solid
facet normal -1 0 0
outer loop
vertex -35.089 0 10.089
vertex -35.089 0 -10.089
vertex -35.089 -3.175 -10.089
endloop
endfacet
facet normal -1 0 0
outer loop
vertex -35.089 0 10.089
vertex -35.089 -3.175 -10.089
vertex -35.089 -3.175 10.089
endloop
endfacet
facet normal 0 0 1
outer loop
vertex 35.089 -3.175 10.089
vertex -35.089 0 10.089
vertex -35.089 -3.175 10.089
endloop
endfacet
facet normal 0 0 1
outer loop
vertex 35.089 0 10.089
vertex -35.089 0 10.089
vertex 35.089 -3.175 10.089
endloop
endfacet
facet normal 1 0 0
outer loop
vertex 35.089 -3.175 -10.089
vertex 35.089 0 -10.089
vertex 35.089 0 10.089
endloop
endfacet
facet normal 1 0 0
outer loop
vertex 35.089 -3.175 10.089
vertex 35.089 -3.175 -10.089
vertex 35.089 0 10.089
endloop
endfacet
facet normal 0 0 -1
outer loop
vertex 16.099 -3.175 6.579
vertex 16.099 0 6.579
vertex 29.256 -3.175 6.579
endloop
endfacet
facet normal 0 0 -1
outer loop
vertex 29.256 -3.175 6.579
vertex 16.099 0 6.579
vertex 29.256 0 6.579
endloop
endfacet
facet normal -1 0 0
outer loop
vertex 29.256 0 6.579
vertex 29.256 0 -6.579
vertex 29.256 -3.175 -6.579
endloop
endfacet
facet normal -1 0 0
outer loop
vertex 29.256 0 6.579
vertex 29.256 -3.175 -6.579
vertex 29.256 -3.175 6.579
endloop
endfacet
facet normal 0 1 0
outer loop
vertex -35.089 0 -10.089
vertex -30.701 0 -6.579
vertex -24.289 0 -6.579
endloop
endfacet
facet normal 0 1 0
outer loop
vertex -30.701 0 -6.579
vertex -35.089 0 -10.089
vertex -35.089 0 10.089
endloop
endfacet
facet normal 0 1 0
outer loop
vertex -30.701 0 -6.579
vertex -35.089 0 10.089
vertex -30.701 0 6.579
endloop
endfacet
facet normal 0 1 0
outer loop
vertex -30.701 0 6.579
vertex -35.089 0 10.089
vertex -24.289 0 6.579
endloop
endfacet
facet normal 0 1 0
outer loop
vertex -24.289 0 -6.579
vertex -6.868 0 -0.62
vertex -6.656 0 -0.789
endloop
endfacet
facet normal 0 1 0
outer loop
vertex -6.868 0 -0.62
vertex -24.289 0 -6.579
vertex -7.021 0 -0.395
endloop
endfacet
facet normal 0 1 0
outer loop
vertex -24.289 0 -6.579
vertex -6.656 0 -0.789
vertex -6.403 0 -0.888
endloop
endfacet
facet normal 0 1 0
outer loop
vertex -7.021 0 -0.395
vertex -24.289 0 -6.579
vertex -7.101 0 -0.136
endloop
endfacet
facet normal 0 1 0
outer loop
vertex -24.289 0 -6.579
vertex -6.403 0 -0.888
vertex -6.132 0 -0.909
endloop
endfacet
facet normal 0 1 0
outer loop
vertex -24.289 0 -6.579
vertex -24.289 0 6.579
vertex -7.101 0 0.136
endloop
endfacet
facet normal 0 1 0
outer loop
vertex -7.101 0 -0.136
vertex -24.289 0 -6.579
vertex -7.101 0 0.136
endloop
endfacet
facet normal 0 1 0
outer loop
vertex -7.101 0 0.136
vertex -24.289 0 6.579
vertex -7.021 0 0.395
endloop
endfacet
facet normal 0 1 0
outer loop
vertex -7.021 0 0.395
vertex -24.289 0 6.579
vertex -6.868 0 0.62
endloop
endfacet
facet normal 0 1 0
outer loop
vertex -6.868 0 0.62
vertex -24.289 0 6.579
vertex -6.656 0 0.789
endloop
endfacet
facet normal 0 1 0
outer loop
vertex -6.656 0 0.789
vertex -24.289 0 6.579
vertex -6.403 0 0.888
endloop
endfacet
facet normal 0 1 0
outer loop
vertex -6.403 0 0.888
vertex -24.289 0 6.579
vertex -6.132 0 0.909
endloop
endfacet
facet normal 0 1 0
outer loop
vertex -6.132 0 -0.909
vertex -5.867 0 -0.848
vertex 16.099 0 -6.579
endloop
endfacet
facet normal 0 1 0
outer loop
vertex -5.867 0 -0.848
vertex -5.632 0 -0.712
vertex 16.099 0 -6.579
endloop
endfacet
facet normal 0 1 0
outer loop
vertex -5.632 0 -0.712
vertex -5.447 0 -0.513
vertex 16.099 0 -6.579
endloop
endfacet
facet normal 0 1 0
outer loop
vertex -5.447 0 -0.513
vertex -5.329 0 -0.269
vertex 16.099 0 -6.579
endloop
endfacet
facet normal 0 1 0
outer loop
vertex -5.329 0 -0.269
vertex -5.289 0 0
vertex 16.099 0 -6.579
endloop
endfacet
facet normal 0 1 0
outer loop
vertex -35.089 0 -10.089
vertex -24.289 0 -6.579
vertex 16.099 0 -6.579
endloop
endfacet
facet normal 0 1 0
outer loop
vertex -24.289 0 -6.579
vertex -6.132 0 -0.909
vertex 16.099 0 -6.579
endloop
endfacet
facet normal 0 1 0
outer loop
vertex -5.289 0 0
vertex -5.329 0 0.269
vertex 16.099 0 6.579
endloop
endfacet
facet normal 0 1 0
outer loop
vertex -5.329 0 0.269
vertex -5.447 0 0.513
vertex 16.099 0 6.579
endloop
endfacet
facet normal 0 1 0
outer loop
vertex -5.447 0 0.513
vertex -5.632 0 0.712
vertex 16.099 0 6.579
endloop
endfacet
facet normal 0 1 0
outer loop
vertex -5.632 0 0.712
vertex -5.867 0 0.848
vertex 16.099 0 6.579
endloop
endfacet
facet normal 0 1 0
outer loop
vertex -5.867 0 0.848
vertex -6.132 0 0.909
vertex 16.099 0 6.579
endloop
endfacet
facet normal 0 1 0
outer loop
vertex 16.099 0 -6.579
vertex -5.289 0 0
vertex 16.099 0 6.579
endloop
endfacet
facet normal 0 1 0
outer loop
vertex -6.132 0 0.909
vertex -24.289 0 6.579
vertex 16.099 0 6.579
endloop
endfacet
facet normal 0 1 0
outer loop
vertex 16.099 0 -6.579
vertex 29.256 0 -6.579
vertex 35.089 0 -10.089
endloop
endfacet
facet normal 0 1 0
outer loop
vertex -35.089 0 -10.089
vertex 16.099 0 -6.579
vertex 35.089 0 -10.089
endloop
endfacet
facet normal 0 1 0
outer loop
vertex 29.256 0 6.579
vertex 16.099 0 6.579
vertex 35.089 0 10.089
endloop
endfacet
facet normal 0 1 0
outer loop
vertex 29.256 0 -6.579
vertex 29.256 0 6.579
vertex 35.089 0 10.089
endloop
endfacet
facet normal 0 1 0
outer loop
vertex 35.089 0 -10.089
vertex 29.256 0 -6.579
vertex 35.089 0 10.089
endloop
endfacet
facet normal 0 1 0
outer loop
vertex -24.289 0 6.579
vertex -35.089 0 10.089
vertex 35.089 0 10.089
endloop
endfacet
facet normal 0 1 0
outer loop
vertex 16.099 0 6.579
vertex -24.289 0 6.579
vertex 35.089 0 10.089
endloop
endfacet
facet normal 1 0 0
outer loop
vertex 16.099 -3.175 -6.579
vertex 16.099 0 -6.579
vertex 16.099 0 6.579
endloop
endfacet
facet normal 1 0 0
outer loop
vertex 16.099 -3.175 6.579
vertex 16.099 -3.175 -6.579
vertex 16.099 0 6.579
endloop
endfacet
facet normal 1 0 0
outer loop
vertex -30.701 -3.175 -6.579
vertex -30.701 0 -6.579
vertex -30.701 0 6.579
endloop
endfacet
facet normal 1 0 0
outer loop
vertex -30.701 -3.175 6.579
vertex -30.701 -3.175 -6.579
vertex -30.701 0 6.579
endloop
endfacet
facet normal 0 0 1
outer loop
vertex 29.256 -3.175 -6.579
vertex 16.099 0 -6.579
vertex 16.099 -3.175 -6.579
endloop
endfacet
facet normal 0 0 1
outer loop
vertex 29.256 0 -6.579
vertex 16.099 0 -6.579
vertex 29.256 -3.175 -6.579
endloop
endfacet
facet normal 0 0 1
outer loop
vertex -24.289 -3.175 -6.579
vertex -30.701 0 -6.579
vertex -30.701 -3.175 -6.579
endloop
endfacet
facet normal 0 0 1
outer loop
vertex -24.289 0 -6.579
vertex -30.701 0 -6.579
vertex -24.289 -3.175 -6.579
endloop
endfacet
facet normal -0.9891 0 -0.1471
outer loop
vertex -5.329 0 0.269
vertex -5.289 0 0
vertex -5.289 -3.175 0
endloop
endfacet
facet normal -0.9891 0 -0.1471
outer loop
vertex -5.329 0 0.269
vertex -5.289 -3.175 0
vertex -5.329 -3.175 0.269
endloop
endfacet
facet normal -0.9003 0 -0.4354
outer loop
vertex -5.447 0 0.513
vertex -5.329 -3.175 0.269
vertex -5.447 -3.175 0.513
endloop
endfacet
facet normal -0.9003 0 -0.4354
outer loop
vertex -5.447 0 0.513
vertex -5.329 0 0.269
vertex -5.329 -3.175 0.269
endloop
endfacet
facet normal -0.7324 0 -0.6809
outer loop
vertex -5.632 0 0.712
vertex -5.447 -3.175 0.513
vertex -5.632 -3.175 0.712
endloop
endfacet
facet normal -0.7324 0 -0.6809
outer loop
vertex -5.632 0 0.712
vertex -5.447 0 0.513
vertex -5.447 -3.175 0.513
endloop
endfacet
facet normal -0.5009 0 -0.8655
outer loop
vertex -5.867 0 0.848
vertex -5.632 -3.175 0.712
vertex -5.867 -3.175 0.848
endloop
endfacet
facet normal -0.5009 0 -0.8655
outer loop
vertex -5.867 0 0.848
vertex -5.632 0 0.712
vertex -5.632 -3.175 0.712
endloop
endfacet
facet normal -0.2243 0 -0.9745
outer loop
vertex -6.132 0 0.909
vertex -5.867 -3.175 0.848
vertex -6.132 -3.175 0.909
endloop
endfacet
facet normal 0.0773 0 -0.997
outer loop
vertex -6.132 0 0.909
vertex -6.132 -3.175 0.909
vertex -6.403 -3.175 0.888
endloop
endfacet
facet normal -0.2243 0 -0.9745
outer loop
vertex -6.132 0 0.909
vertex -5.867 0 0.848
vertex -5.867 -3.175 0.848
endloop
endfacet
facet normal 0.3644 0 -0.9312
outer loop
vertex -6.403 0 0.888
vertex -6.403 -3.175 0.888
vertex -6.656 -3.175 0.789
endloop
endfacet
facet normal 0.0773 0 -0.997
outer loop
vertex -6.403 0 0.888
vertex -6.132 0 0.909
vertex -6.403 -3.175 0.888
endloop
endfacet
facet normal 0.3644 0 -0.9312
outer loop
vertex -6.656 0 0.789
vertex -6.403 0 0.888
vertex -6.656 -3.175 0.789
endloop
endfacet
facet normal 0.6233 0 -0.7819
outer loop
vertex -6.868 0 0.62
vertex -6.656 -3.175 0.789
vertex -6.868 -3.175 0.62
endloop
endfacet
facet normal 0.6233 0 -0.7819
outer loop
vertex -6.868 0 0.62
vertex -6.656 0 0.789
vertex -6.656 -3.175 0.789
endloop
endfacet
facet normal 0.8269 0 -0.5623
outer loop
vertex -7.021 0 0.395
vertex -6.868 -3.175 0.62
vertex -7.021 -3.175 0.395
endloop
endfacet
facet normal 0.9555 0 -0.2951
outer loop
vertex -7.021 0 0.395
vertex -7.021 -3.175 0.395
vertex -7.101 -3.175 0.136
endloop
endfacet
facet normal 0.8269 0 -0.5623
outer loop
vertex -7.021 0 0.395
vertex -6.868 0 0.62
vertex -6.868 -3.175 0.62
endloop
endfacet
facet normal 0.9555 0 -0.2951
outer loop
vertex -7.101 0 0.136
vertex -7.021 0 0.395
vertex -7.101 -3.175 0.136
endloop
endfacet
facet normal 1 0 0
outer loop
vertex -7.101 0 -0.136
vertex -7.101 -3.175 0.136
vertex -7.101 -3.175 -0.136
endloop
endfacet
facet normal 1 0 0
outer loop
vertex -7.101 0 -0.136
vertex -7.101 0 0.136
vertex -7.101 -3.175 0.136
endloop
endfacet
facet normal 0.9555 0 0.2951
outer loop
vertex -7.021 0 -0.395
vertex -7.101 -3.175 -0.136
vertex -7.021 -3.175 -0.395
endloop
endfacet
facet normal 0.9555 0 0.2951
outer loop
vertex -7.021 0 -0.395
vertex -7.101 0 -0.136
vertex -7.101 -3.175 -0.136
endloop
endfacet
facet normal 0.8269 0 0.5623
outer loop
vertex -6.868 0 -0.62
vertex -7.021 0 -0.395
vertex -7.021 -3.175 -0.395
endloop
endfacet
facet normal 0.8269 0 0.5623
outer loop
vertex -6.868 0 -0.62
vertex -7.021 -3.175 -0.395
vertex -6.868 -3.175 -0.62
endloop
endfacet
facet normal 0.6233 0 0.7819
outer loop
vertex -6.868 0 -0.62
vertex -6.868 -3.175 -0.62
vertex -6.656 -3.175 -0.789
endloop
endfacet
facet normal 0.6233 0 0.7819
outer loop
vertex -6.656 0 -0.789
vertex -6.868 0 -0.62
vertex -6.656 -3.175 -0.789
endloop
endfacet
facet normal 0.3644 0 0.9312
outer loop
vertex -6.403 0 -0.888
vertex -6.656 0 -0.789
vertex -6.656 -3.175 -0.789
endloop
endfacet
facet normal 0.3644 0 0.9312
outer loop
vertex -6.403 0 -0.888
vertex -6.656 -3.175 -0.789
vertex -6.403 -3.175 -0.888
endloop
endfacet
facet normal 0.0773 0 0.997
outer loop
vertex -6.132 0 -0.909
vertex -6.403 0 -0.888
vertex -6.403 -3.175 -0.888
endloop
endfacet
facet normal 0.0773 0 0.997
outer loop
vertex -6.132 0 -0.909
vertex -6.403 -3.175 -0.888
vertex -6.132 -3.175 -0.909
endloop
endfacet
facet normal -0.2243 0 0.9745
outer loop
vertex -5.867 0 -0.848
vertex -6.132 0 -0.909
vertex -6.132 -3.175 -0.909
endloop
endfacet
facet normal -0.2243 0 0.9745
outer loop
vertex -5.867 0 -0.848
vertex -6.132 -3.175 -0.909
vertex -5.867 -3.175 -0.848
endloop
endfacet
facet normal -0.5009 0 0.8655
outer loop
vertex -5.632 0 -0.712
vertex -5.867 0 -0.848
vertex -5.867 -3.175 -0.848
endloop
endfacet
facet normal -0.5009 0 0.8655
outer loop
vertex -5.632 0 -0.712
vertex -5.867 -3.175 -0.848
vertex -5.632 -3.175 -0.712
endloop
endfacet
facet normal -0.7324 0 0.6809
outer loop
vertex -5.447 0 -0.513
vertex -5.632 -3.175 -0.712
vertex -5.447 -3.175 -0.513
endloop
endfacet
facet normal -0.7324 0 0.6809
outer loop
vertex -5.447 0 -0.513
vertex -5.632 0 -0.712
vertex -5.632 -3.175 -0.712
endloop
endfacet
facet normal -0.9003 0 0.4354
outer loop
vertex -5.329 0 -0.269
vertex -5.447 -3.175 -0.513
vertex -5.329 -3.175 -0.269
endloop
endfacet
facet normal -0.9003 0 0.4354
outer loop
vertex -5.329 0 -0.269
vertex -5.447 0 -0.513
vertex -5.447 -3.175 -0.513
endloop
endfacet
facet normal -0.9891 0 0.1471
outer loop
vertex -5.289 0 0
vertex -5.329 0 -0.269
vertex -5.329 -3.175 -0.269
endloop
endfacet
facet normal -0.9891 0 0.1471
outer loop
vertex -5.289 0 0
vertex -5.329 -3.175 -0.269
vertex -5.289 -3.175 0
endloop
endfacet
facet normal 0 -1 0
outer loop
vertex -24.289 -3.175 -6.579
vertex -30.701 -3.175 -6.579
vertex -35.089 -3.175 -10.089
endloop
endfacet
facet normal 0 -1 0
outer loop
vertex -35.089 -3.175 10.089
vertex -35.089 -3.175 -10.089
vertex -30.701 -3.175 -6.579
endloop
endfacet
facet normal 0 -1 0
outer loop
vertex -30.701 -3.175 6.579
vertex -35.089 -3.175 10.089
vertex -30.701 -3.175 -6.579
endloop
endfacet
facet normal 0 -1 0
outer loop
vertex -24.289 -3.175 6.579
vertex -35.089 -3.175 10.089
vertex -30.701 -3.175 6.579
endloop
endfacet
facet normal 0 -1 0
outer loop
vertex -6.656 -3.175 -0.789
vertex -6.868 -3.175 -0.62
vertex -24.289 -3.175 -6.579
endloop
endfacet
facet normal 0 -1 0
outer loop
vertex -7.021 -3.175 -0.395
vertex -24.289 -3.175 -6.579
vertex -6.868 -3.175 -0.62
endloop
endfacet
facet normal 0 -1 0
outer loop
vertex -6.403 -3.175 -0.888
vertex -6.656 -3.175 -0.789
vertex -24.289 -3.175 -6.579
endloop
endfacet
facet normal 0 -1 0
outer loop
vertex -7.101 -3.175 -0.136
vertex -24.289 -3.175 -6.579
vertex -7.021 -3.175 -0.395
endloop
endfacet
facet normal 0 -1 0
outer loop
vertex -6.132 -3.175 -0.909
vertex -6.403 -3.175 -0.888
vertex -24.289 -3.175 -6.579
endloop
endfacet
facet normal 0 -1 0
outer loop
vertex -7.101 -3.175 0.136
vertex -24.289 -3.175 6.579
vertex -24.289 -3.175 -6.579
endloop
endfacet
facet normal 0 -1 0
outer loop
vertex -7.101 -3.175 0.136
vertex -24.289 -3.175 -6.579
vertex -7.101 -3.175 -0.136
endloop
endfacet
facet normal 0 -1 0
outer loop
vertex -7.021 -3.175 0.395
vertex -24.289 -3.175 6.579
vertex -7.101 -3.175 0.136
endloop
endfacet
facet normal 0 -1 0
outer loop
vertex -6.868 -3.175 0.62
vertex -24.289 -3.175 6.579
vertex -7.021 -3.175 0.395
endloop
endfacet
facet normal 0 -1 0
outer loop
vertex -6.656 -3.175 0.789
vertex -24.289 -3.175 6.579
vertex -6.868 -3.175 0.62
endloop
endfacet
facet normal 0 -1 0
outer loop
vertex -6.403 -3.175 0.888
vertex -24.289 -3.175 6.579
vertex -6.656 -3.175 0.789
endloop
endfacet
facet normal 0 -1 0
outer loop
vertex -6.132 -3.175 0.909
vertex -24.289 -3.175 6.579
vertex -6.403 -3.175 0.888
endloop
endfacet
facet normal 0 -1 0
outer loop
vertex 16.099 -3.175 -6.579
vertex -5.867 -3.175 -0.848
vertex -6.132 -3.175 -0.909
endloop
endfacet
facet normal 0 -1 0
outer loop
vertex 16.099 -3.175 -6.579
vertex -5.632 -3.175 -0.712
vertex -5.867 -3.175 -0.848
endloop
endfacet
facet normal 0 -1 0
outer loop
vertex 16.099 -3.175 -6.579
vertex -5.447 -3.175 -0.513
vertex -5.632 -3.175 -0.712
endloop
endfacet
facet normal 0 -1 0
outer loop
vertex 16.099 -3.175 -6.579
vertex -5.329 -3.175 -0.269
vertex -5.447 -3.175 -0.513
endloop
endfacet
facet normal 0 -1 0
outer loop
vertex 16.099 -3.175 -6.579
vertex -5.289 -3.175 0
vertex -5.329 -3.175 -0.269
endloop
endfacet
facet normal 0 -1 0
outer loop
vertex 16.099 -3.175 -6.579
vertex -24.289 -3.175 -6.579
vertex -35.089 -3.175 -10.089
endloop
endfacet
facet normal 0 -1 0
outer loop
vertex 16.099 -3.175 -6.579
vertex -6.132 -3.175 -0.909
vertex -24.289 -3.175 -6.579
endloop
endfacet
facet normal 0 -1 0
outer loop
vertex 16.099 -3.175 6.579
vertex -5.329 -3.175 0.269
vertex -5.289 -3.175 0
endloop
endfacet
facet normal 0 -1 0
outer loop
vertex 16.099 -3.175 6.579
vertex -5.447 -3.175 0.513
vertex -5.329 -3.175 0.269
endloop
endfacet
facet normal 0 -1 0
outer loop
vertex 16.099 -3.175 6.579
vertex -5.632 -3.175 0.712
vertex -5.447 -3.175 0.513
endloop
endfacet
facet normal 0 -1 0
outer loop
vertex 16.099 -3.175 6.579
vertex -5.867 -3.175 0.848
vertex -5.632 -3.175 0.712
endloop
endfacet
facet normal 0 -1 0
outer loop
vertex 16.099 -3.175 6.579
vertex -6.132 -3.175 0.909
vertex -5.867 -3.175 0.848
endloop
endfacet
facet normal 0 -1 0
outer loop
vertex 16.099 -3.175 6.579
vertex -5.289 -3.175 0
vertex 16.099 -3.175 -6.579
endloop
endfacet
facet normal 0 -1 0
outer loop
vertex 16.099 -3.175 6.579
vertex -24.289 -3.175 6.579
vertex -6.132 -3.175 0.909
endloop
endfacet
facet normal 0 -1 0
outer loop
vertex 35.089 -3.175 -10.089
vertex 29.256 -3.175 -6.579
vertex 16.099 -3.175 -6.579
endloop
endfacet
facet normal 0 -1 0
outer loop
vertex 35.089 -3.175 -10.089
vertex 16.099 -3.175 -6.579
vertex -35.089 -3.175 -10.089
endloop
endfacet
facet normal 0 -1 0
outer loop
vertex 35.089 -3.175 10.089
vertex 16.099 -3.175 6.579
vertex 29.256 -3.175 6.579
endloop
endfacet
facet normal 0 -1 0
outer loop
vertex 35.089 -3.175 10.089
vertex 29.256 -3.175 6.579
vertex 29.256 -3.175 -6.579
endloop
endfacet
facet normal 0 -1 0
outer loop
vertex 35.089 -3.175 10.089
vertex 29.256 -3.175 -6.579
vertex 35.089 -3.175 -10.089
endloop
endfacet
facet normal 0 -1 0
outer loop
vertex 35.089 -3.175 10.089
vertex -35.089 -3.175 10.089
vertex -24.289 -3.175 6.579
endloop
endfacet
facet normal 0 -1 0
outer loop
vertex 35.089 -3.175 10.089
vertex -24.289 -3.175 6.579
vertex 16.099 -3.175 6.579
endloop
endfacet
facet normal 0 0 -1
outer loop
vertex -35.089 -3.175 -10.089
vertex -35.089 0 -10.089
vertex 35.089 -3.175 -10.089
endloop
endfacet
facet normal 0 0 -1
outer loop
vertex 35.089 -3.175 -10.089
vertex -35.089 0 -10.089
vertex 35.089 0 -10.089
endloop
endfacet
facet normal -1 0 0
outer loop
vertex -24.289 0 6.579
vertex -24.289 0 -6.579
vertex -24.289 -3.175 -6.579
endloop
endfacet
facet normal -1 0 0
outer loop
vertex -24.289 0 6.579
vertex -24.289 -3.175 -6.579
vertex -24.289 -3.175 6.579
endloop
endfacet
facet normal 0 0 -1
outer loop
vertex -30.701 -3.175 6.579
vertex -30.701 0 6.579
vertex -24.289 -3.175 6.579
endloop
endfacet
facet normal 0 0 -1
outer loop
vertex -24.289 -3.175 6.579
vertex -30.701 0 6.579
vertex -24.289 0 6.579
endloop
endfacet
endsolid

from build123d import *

# Parameters (mm, degrees)
F0_W     = 70.1778
F0_H     = 20.1778
F0_W_2   = 6.4122
F0_H_2   = 13.1572
F0_R     = 0.9111
F0_W_3   = 13.1572
F1_DEPTH = 3.175


with BuildPart() as f1:
    # F0 (on Front) → F1 (new body)
    with BuildSketch(Plane.XZ):
        Rectangle(F0_W, F0_H)
        with Locations((-27.495, 0)):
            Rectangle(F0_W_2, F0_H_2, mode=Mode.SUBTRACT)
        with Locations((-6.2, 0)):
            Circle(F0_R, mode=Mode.SUBTRACT)
        with Locations((22.6775, 0)):
            Rectangle(F0_W_3, F0_H_2, mode=Mode.SUBTRACT)
    extrude(amount=F1_DEPTH)


solid = f1.part
